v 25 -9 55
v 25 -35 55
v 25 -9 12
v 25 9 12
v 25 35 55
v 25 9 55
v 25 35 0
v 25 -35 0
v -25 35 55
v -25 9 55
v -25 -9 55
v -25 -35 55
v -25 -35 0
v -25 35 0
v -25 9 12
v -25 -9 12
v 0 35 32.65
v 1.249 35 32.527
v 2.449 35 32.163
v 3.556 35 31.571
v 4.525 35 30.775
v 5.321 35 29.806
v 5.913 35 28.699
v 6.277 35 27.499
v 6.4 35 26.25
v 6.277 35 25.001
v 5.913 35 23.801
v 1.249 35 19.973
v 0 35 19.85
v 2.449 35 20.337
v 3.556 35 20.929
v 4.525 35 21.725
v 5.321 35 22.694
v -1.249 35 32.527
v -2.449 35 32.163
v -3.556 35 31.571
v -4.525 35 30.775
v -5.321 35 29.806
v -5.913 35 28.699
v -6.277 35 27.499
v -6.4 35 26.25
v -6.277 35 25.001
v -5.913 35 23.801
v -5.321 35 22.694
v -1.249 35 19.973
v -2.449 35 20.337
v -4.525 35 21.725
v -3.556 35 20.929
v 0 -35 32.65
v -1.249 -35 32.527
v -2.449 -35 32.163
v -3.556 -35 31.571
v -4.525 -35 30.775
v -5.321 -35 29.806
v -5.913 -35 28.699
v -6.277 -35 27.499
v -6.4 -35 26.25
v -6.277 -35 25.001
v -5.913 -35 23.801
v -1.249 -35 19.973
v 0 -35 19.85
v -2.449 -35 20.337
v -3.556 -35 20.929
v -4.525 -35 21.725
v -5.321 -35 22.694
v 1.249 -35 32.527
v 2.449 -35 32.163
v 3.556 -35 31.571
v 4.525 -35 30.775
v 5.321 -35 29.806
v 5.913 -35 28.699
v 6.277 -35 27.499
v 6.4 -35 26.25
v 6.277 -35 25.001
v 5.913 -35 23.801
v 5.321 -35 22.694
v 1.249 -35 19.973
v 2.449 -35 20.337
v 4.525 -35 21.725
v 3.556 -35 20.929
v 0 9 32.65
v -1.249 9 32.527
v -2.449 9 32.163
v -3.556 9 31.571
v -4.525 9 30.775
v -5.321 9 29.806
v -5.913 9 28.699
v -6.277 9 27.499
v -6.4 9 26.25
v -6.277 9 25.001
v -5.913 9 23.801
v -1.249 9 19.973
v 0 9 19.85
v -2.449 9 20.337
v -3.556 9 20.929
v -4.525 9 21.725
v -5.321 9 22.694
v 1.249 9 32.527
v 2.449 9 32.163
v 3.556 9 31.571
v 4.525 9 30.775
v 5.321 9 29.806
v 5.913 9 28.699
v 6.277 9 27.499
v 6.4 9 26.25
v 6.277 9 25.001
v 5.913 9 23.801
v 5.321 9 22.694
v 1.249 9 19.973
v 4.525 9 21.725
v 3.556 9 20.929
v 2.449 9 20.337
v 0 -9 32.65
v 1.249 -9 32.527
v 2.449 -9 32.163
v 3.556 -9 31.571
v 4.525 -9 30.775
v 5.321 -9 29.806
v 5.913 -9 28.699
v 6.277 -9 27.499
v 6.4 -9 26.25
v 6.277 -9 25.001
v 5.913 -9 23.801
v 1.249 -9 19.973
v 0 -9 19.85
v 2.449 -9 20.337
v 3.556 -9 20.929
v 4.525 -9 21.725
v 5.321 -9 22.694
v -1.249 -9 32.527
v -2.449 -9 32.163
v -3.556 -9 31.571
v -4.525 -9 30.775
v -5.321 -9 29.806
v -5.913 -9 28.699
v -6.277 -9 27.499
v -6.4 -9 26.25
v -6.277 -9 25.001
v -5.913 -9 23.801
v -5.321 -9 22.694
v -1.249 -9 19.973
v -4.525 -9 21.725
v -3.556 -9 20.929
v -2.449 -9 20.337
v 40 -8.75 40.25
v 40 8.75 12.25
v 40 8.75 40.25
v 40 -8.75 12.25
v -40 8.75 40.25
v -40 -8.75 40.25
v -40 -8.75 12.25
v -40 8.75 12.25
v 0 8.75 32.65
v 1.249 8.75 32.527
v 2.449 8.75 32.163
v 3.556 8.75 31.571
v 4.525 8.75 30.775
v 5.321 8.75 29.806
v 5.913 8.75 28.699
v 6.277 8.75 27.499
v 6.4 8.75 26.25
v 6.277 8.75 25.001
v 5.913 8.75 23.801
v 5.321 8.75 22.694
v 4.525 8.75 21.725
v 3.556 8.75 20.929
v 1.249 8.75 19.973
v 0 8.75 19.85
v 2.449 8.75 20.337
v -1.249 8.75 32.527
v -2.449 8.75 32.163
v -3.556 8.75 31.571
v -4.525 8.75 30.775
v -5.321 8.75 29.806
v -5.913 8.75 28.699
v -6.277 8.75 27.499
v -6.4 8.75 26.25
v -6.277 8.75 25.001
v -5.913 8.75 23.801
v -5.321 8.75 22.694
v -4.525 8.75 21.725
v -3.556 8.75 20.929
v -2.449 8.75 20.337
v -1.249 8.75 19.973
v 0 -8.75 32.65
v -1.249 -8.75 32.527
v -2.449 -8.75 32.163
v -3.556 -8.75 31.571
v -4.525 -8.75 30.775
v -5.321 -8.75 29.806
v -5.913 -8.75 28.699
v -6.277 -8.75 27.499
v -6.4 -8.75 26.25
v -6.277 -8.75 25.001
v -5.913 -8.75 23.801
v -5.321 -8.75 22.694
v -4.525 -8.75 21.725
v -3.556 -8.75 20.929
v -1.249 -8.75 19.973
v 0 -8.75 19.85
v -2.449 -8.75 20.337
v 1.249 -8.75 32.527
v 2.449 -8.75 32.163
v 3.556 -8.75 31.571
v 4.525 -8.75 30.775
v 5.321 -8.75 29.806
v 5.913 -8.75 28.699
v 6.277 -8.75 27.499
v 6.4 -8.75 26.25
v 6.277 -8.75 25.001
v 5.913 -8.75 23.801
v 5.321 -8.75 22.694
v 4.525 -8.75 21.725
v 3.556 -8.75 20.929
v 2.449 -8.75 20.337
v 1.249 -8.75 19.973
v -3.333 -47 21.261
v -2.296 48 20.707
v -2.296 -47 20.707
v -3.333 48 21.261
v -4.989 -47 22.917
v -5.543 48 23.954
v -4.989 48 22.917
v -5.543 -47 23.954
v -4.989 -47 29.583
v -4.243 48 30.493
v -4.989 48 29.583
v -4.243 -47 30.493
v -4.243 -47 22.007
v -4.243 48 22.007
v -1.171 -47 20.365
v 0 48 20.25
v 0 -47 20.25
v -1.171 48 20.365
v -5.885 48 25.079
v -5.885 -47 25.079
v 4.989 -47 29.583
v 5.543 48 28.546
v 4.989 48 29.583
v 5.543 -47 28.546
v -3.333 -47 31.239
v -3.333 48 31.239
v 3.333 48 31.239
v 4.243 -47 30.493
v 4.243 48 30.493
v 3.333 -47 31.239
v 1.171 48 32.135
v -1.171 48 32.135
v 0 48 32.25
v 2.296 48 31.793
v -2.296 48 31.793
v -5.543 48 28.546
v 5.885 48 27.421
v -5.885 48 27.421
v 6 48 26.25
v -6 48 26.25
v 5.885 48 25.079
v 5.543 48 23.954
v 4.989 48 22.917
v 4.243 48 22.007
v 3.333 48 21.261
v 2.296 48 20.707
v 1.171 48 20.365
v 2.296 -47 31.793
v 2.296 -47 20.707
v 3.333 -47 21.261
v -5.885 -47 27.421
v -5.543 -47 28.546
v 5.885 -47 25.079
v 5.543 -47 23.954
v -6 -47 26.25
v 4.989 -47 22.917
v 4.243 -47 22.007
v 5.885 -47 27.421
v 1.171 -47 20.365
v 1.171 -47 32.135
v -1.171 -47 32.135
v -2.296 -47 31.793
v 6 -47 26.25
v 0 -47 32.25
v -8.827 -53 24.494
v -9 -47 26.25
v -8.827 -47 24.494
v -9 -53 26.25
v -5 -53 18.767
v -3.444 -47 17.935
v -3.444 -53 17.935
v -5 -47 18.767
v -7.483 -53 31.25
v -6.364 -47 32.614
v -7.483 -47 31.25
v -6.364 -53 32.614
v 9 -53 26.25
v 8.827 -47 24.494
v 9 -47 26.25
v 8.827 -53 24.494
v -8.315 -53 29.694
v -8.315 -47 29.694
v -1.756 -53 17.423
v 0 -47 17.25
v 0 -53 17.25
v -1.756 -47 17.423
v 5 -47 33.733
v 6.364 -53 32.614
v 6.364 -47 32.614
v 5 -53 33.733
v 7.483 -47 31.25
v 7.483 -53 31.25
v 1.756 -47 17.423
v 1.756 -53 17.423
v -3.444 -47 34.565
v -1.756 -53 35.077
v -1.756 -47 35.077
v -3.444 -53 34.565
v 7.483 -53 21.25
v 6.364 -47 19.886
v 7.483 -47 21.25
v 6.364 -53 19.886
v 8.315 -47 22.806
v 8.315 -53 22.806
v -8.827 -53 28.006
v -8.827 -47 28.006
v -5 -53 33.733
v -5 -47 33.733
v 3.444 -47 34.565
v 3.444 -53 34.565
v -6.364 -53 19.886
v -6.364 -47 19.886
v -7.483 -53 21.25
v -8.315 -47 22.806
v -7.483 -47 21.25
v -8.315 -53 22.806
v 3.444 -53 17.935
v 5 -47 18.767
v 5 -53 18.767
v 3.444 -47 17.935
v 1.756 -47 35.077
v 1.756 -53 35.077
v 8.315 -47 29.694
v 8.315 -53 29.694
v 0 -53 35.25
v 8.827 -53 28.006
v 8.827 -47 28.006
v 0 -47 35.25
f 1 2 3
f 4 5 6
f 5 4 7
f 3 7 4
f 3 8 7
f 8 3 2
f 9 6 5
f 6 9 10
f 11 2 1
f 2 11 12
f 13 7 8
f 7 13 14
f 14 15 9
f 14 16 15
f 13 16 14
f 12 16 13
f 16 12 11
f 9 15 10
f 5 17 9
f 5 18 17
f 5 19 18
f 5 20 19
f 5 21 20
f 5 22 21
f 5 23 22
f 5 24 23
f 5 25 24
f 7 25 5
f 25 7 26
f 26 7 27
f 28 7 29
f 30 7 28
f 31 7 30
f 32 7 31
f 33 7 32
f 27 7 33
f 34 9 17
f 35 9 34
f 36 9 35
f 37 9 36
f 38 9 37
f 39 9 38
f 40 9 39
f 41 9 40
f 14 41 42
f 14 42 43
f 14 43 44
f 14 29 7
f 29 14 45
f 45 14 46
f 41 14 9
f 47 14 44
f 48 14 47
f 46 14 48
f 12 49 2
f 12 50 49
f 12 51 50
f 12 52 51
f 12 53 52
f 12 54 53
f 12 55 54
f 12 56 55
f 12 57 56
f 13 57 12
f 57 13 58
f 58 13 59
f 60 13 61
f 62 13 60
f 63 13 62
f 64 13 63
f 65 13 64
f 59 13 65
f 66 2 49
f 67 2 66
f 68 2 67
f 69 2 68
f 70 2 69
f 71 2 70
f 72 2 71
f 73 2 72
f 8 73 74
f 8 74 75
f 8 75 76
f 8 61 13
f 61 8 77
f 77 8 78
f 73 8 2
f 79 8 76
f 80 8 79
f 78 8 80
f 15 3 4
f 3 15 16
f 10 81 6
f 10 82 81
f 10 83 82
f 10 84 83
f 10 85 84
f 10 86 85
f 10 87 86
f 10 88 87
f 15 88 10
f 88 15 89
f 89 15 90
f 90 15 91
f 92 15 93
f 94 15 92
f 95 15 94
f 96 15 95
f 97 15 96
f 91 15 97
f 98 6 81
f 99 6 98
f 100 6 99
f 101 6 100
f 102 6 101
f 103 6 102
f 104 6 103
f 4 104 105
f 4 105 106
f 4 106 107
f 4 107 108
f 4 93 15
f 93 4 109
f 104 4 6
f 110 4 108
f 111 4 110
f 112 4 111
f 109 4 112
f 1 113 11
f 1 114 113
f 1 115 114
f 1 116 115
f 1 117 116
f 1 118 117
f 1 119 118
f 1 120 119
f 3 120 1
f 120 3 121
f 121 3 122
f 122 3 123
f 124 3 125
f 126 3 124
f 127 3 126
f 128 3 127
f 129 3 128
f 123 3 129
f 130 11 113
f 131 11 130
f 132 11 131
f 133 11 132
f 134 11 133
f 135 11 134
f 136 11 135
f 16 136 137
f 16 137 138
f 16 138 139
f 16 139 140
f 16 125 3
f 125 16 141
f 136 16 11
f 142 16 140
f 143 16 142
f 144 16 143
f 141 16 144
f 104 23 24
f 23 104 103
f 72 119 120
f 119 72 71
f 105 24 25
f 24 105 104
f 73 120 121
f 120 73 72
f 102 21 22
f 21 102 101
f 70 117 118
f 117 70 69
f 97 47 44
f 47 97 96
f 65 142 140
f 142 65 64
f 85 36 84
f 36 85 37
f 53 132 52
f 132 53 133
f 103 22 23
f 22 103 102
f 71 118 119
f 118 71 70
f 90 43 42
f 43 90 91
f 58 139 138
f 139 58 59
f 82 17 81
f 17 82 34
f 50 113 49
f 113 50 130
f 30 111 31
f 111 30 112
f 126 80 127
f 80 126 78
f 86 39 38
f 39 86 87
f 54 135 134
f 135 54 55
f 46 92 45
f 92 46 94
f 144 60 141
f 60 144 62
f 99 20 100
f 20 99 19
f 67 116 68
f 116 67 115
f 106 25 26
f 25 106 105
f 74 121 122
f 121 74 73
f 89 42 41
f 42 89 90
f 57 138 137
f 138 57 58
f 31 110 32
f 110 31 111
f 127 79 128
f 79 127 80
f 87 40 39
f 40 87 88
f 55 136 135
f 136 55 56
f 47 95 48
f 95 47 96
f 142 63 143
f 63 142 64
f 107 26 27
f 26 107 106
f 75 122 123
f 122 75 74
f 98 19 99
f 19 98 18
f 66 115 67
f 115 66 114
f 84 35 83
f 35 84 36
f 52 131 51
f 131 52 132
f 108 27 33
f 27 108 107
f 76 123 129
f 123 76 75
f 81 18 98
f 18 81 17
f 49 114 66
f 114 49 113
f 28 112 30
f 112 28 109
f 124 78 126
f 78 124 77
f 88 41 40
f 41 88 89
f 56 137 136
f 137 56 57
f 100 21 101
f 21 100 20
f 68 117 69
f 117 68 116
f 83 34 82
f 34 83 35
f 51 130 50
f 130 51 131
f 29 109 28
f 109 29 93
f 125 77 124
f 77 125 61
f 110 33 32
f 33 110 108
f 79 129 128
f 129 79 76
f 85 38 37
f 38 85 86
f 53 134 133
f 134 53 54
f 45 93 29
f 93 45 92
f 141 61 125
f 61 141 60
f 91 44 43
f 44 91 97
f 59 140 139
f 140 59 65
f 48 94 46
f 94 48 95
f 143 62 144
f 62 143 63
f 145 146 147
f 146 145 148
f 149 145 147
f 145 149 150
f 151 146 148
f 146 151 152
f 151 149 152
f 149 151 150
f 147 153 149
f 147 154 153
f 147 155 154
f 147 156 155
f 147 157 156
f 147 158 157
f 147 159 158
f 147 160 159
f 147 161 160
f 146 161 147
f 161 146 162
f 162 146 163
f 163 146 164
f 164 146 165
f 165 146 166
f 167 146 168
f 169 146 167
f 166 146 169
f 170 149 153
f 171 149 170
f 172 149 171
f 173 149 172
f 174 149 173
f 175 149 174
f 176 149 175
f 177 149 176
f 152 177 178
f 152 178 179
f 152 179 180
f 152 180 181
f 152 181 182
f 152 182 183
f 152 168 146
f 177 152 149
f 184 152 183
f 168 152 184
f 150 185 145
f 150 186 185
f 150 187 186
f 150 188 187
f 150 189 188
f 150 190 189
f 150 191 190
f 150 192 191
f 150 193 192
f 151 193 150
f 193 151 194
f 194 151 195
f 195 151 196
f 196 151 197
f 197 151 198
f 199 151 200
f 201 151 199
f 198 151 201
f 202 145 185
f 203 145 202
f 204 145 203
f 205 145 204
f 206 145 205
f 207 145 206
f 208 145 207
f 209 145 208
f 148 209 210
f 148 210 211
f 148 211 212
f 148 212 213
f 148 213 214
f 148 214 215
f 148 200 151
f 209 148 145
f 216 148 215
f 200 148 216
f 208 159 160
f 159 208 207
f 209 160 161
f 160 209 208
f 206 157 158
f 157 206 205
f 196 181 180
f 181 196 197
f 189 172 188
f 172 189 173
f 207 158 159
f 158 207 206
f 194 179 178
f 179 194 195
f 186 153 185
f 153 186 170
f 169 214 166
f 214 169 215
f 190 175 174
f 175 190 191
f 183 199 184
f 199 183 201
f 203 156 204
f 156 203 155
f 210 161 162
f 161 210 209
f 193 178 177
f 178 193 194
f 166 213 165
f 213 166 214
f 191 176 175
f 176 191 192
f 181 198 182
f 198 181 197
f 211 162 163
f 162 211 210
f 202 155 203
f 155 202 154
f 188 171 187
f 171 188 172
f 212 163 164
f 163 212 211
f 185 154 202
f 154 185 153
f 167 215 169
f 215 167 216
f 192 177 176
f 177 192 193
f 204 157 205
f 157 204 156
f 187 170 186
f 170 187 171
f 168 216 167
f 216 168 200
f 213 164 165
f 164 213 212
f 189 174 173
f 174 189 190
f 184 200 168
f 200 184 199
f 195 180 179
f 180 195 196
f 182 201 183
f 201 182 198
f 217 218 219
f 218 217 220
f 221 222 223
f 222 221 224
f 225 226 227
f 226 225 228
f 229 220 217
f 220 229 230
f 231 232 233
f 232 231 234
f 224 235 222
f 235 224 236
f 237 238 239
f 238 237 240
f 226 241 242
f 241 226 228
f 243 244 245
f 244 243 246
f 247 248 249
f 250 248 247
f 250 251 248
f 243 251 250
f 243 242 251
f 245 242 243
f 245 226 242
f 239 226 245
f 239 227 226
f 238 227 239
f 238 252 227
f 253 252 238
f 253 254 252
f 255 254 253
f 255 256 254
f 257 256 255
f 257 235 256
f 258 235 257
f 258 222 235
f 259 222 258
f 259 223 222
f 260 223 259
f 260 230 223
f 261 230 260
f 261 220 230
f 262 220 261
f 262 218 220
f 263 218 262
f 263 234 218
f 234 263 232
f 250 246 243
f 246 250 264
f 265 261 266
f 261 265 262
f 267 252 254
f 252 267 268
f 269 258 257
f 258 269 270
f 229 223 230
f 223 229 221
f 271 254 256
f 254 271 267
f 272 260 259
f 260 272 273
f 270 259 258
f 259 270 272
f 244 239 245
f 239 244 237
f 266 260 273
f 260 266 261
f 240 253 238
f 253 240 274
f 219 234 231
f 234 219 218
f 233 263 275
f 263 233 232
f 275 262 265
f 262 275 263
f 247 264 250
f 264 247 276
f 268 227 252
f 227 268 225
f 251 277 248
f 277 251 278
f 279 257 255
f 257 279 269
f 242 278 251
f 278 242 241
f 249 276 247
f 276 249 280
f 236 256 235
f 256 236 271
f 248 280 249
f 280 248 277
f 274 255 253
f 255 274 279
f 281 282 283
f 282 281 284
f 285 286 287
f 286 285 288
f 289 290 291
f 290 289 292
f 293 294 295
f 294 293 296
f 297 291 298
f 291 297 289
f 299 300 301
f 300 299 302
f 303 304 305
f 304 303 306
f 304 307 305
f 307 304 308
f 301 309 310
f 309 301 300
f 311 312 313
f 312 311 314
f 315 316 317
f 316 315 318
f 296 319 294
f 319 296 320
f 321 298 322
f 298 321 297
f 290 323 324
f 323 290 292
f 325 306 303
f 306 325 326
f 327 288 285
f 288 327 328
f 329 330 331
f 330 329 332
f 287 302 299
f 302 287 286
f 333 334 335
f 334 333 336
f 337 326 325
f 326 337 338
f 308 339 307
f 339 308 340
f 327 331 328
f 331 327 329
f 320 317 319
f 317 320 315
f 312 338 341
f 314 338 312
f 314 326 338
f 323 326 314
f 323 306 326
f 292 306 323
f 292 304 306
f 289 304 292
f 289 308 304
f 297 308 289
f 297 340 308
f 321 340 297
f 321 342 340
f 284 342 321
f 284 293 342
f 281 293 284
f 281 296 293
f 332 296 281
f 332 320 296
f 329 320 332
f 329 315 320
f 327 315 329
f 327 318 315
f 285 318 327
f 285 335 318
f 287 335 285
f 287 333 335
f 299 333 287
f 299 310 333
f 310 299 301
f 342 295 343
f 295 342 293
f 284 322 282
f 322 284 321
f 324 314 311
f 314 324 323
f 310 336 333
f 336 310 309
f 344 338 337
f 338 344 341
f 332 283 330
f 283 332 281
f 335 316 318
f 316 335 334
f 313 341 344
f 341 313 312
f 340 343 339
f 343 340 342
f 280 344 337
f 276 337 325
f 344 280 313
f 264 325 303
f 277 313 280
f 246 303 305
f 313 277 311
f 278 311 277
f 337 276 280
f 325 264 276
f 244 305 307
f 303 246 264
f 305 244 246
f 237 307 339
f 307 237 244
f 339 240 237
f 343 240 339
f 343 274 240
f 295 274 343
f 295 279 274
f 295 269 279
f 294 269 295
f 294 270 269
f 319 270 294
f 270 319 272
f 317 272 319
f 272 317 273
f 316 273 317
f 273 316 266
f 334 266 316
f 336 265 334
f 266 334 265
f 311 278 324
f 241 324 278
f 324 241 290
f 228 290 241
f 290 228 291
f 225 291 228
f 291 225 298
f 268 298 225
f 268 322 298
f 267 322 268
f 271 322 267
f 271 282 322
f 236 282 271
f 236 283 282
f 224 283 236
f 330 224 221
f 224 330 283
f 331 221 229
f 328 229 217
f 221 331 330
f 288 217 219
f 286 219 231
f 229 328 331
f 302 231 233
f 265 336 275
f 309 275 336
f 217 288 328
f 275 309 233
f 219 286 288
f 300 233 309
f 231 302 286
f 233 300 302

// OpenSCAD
$fn = 32;

// ------------------------------------------------------------------------
// Clevis joint: 50 mm clevis, pin d12
// Every part is its own module, assembly() places them once.
// ------------------------------------------------------------------------

// --- part 1 ---
module clevis() {
  difference() {
    translate([-25, -35, 0]) cube([50, 70, 55]);
    translate([-26, -9, 12]) cube([52, 18, 44]);
    translate([0, 0, 26.25]) rotate([90, 0, 0]) cylinder(h = 72, d = 12.8, center = true);
  }
}

// --- part 2 ---
module eye() {
  difference() {
    translate([-40, -8.75, 0]) cube([80, 17.5, 28]);
    translate([0, 0, 14]) rotate([90, 0, 0]) cylinder(h = 19.5, d = 12.8, center = true);
  }
}

// --- part 3 ---
module pin() {
  rotate([0, 90, 0]) cylinder(h = 96, d = 12, center = true);
  translate([-53, 0, 0]) rotate([0, 90, 0]) cylinder(h = 6, d = 18);
}

// --- assembly ---
module assembly() {
  translate([0, 0, 0]) rotate([0, 0, 0]) clevis();
  translate([0, 0, 12.25]) rotate([0, 0, 0]) eye();
  translate([0, 0, 26.25]) rotate([0, 0, 90]) pin();
}

assembly();
